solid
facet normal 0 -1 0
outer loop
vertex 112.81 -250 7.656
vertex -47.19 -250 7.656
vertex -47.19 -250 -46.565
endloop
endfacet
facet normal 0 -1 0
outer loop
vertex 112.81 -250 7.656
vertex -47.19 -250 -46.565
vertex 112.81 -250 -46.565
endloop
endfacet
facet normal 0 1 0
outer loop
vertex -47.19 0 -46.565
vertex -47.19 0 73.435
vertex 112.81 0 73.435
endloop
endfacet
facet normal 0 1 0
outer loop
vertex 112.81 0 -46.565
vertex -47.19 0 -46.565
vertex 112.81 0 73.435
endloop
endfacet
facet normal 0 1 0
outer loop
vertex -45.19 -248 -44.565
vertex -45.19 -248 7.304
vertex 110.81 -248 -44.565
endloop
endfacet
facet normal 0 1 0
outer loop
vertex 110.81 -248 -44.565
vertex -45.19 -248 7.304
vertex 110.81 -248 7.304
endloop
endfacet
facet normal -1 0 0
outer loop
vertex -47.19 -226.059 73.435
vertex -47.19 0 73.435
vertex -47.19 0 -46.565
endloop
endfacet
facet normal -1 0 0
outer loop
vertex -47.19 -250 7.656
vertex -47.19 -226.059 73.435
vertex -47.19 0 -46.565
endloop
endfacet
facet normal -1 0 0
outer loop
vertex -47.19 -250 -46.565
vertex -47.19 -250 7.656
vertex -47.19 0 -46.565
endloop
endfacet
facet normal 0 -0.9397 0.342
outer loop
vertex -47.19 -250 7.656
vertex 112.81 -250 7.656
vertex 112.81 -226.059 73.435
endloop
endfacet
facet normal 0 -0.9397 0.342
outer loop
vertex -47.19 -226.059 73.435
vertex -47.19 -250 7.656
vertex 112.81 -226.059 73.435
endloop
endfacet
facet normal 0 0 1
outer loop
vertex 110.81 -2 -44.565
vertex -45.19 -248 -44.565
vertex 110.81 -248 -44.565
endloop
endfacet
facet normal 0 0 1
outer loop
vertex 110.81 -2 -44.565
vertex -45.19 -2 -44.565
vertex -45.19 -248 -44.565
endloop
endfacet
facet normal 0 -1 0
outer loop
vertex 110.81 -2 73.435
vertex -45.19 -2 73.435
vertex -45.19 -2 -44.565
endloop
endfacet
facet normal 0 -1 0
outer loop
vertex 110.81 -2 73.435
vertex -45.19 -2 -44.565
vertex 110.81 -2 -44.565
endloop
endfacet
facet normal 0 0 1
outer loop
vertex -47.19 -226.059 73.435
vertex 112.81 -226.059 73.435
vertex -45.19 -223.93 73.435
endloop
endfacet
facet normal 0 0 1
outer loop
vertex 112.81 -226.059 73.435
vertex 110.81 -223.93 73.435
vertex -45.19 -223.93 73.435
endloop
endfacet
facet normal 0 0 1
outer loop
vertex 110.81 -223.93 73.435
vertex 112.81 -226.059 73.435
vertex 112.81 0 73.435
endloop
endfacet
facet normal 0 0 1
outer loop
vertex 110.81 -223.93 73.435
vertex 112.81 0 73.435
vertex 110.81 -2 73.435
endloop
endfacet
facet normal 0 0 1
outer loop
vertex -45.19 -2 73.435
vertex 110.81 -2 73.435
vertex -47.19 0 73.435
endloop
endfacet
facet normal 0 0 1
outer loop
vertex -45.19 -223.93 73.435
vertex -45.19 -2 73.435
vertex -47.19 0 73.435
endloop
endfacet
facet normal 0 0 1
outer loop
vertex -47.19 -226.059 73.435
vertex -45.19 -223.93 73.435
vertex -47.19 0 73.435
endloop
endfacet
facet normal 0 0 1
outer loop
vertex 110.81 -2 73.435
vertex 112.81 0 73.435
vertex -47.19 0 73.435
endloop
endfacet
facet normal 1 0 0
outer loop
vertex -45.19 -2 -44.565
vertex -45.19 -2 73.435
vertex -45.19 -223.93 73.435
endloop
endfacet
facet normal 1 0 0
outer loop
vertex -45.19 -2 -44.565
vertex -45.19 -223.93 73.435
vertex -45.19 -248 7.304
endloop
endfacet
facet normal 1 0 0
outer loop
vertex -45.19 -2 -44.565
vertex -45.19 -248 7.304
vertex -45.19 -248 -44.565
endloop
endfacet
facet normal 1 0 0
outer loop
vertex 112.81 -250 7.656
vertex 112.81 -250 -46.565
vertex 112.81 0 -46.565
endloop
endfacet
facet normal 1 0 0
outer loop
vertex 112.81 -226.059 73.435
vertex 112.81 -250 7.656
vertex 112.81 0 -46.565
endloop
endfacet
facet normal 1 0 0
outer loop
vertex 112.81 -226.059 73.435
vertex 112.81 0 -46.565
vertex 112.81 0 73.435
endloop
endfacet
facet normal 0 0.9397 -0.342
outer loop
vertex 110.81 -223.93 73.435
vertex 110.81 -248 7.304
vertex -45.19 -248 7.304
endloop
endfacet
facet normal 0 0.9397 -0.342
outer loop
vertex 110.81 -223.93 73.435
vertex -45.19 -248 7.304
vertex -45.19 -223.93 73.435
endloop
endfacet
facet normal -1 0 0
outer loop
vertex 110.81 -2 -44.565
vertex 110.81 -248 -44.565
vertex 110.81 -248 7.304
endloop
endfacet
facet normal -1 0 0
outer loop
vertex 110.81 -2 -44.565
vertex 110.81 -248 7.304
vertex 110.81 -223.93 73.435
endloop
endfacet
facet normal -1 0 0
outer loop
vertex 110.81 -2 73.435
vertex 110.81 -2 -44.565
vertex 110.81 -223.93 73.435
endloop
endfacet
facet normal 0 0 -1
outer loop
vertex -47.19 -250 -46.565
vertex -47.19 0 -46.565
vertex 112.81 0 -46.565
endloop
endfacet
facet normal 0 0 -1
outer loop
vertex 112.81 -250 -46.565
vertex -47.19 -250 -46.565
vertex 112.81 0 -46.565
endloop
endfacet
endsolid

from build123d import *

# Parameters (mm, degrees)
F1_DEPTH = 250
F3_DEPTH = 160
F4_T     = -2


with BuildPart() as f1:
    # F0 (on Front) → F1 (new body)
    with BuildSketch(Plane.XZ):
        Polygon((72.809999, 73.434824), (-47.190001, 73.434824), (-47.190001, -46.565176), (72.809999, -46.565176), (112.809999, -46.565176), (112.809999, 73.434824), align=None)
    extrude(amount=F1_DEPTH)

    # F2 (on face) → F3 (cut, through all)
    with BuildSketch(Plane.YZ.offset(112.809999)):
        Polygon((-250, 73.434824), (-250, 7.656341), (-226.05859, 73.434824), align=None)
    extrude(amount=-F3_DEPTH, mode=Mode.SUBTRACT)

    # F4
    f4_openings = [f1.faces().sort_by_distance(p)[0] for p in [
        (32.809999, -113.029295, 73.434824),
    ]]
    offset(amount=F4_T, openings=f4_openings)


solid = f1.part
